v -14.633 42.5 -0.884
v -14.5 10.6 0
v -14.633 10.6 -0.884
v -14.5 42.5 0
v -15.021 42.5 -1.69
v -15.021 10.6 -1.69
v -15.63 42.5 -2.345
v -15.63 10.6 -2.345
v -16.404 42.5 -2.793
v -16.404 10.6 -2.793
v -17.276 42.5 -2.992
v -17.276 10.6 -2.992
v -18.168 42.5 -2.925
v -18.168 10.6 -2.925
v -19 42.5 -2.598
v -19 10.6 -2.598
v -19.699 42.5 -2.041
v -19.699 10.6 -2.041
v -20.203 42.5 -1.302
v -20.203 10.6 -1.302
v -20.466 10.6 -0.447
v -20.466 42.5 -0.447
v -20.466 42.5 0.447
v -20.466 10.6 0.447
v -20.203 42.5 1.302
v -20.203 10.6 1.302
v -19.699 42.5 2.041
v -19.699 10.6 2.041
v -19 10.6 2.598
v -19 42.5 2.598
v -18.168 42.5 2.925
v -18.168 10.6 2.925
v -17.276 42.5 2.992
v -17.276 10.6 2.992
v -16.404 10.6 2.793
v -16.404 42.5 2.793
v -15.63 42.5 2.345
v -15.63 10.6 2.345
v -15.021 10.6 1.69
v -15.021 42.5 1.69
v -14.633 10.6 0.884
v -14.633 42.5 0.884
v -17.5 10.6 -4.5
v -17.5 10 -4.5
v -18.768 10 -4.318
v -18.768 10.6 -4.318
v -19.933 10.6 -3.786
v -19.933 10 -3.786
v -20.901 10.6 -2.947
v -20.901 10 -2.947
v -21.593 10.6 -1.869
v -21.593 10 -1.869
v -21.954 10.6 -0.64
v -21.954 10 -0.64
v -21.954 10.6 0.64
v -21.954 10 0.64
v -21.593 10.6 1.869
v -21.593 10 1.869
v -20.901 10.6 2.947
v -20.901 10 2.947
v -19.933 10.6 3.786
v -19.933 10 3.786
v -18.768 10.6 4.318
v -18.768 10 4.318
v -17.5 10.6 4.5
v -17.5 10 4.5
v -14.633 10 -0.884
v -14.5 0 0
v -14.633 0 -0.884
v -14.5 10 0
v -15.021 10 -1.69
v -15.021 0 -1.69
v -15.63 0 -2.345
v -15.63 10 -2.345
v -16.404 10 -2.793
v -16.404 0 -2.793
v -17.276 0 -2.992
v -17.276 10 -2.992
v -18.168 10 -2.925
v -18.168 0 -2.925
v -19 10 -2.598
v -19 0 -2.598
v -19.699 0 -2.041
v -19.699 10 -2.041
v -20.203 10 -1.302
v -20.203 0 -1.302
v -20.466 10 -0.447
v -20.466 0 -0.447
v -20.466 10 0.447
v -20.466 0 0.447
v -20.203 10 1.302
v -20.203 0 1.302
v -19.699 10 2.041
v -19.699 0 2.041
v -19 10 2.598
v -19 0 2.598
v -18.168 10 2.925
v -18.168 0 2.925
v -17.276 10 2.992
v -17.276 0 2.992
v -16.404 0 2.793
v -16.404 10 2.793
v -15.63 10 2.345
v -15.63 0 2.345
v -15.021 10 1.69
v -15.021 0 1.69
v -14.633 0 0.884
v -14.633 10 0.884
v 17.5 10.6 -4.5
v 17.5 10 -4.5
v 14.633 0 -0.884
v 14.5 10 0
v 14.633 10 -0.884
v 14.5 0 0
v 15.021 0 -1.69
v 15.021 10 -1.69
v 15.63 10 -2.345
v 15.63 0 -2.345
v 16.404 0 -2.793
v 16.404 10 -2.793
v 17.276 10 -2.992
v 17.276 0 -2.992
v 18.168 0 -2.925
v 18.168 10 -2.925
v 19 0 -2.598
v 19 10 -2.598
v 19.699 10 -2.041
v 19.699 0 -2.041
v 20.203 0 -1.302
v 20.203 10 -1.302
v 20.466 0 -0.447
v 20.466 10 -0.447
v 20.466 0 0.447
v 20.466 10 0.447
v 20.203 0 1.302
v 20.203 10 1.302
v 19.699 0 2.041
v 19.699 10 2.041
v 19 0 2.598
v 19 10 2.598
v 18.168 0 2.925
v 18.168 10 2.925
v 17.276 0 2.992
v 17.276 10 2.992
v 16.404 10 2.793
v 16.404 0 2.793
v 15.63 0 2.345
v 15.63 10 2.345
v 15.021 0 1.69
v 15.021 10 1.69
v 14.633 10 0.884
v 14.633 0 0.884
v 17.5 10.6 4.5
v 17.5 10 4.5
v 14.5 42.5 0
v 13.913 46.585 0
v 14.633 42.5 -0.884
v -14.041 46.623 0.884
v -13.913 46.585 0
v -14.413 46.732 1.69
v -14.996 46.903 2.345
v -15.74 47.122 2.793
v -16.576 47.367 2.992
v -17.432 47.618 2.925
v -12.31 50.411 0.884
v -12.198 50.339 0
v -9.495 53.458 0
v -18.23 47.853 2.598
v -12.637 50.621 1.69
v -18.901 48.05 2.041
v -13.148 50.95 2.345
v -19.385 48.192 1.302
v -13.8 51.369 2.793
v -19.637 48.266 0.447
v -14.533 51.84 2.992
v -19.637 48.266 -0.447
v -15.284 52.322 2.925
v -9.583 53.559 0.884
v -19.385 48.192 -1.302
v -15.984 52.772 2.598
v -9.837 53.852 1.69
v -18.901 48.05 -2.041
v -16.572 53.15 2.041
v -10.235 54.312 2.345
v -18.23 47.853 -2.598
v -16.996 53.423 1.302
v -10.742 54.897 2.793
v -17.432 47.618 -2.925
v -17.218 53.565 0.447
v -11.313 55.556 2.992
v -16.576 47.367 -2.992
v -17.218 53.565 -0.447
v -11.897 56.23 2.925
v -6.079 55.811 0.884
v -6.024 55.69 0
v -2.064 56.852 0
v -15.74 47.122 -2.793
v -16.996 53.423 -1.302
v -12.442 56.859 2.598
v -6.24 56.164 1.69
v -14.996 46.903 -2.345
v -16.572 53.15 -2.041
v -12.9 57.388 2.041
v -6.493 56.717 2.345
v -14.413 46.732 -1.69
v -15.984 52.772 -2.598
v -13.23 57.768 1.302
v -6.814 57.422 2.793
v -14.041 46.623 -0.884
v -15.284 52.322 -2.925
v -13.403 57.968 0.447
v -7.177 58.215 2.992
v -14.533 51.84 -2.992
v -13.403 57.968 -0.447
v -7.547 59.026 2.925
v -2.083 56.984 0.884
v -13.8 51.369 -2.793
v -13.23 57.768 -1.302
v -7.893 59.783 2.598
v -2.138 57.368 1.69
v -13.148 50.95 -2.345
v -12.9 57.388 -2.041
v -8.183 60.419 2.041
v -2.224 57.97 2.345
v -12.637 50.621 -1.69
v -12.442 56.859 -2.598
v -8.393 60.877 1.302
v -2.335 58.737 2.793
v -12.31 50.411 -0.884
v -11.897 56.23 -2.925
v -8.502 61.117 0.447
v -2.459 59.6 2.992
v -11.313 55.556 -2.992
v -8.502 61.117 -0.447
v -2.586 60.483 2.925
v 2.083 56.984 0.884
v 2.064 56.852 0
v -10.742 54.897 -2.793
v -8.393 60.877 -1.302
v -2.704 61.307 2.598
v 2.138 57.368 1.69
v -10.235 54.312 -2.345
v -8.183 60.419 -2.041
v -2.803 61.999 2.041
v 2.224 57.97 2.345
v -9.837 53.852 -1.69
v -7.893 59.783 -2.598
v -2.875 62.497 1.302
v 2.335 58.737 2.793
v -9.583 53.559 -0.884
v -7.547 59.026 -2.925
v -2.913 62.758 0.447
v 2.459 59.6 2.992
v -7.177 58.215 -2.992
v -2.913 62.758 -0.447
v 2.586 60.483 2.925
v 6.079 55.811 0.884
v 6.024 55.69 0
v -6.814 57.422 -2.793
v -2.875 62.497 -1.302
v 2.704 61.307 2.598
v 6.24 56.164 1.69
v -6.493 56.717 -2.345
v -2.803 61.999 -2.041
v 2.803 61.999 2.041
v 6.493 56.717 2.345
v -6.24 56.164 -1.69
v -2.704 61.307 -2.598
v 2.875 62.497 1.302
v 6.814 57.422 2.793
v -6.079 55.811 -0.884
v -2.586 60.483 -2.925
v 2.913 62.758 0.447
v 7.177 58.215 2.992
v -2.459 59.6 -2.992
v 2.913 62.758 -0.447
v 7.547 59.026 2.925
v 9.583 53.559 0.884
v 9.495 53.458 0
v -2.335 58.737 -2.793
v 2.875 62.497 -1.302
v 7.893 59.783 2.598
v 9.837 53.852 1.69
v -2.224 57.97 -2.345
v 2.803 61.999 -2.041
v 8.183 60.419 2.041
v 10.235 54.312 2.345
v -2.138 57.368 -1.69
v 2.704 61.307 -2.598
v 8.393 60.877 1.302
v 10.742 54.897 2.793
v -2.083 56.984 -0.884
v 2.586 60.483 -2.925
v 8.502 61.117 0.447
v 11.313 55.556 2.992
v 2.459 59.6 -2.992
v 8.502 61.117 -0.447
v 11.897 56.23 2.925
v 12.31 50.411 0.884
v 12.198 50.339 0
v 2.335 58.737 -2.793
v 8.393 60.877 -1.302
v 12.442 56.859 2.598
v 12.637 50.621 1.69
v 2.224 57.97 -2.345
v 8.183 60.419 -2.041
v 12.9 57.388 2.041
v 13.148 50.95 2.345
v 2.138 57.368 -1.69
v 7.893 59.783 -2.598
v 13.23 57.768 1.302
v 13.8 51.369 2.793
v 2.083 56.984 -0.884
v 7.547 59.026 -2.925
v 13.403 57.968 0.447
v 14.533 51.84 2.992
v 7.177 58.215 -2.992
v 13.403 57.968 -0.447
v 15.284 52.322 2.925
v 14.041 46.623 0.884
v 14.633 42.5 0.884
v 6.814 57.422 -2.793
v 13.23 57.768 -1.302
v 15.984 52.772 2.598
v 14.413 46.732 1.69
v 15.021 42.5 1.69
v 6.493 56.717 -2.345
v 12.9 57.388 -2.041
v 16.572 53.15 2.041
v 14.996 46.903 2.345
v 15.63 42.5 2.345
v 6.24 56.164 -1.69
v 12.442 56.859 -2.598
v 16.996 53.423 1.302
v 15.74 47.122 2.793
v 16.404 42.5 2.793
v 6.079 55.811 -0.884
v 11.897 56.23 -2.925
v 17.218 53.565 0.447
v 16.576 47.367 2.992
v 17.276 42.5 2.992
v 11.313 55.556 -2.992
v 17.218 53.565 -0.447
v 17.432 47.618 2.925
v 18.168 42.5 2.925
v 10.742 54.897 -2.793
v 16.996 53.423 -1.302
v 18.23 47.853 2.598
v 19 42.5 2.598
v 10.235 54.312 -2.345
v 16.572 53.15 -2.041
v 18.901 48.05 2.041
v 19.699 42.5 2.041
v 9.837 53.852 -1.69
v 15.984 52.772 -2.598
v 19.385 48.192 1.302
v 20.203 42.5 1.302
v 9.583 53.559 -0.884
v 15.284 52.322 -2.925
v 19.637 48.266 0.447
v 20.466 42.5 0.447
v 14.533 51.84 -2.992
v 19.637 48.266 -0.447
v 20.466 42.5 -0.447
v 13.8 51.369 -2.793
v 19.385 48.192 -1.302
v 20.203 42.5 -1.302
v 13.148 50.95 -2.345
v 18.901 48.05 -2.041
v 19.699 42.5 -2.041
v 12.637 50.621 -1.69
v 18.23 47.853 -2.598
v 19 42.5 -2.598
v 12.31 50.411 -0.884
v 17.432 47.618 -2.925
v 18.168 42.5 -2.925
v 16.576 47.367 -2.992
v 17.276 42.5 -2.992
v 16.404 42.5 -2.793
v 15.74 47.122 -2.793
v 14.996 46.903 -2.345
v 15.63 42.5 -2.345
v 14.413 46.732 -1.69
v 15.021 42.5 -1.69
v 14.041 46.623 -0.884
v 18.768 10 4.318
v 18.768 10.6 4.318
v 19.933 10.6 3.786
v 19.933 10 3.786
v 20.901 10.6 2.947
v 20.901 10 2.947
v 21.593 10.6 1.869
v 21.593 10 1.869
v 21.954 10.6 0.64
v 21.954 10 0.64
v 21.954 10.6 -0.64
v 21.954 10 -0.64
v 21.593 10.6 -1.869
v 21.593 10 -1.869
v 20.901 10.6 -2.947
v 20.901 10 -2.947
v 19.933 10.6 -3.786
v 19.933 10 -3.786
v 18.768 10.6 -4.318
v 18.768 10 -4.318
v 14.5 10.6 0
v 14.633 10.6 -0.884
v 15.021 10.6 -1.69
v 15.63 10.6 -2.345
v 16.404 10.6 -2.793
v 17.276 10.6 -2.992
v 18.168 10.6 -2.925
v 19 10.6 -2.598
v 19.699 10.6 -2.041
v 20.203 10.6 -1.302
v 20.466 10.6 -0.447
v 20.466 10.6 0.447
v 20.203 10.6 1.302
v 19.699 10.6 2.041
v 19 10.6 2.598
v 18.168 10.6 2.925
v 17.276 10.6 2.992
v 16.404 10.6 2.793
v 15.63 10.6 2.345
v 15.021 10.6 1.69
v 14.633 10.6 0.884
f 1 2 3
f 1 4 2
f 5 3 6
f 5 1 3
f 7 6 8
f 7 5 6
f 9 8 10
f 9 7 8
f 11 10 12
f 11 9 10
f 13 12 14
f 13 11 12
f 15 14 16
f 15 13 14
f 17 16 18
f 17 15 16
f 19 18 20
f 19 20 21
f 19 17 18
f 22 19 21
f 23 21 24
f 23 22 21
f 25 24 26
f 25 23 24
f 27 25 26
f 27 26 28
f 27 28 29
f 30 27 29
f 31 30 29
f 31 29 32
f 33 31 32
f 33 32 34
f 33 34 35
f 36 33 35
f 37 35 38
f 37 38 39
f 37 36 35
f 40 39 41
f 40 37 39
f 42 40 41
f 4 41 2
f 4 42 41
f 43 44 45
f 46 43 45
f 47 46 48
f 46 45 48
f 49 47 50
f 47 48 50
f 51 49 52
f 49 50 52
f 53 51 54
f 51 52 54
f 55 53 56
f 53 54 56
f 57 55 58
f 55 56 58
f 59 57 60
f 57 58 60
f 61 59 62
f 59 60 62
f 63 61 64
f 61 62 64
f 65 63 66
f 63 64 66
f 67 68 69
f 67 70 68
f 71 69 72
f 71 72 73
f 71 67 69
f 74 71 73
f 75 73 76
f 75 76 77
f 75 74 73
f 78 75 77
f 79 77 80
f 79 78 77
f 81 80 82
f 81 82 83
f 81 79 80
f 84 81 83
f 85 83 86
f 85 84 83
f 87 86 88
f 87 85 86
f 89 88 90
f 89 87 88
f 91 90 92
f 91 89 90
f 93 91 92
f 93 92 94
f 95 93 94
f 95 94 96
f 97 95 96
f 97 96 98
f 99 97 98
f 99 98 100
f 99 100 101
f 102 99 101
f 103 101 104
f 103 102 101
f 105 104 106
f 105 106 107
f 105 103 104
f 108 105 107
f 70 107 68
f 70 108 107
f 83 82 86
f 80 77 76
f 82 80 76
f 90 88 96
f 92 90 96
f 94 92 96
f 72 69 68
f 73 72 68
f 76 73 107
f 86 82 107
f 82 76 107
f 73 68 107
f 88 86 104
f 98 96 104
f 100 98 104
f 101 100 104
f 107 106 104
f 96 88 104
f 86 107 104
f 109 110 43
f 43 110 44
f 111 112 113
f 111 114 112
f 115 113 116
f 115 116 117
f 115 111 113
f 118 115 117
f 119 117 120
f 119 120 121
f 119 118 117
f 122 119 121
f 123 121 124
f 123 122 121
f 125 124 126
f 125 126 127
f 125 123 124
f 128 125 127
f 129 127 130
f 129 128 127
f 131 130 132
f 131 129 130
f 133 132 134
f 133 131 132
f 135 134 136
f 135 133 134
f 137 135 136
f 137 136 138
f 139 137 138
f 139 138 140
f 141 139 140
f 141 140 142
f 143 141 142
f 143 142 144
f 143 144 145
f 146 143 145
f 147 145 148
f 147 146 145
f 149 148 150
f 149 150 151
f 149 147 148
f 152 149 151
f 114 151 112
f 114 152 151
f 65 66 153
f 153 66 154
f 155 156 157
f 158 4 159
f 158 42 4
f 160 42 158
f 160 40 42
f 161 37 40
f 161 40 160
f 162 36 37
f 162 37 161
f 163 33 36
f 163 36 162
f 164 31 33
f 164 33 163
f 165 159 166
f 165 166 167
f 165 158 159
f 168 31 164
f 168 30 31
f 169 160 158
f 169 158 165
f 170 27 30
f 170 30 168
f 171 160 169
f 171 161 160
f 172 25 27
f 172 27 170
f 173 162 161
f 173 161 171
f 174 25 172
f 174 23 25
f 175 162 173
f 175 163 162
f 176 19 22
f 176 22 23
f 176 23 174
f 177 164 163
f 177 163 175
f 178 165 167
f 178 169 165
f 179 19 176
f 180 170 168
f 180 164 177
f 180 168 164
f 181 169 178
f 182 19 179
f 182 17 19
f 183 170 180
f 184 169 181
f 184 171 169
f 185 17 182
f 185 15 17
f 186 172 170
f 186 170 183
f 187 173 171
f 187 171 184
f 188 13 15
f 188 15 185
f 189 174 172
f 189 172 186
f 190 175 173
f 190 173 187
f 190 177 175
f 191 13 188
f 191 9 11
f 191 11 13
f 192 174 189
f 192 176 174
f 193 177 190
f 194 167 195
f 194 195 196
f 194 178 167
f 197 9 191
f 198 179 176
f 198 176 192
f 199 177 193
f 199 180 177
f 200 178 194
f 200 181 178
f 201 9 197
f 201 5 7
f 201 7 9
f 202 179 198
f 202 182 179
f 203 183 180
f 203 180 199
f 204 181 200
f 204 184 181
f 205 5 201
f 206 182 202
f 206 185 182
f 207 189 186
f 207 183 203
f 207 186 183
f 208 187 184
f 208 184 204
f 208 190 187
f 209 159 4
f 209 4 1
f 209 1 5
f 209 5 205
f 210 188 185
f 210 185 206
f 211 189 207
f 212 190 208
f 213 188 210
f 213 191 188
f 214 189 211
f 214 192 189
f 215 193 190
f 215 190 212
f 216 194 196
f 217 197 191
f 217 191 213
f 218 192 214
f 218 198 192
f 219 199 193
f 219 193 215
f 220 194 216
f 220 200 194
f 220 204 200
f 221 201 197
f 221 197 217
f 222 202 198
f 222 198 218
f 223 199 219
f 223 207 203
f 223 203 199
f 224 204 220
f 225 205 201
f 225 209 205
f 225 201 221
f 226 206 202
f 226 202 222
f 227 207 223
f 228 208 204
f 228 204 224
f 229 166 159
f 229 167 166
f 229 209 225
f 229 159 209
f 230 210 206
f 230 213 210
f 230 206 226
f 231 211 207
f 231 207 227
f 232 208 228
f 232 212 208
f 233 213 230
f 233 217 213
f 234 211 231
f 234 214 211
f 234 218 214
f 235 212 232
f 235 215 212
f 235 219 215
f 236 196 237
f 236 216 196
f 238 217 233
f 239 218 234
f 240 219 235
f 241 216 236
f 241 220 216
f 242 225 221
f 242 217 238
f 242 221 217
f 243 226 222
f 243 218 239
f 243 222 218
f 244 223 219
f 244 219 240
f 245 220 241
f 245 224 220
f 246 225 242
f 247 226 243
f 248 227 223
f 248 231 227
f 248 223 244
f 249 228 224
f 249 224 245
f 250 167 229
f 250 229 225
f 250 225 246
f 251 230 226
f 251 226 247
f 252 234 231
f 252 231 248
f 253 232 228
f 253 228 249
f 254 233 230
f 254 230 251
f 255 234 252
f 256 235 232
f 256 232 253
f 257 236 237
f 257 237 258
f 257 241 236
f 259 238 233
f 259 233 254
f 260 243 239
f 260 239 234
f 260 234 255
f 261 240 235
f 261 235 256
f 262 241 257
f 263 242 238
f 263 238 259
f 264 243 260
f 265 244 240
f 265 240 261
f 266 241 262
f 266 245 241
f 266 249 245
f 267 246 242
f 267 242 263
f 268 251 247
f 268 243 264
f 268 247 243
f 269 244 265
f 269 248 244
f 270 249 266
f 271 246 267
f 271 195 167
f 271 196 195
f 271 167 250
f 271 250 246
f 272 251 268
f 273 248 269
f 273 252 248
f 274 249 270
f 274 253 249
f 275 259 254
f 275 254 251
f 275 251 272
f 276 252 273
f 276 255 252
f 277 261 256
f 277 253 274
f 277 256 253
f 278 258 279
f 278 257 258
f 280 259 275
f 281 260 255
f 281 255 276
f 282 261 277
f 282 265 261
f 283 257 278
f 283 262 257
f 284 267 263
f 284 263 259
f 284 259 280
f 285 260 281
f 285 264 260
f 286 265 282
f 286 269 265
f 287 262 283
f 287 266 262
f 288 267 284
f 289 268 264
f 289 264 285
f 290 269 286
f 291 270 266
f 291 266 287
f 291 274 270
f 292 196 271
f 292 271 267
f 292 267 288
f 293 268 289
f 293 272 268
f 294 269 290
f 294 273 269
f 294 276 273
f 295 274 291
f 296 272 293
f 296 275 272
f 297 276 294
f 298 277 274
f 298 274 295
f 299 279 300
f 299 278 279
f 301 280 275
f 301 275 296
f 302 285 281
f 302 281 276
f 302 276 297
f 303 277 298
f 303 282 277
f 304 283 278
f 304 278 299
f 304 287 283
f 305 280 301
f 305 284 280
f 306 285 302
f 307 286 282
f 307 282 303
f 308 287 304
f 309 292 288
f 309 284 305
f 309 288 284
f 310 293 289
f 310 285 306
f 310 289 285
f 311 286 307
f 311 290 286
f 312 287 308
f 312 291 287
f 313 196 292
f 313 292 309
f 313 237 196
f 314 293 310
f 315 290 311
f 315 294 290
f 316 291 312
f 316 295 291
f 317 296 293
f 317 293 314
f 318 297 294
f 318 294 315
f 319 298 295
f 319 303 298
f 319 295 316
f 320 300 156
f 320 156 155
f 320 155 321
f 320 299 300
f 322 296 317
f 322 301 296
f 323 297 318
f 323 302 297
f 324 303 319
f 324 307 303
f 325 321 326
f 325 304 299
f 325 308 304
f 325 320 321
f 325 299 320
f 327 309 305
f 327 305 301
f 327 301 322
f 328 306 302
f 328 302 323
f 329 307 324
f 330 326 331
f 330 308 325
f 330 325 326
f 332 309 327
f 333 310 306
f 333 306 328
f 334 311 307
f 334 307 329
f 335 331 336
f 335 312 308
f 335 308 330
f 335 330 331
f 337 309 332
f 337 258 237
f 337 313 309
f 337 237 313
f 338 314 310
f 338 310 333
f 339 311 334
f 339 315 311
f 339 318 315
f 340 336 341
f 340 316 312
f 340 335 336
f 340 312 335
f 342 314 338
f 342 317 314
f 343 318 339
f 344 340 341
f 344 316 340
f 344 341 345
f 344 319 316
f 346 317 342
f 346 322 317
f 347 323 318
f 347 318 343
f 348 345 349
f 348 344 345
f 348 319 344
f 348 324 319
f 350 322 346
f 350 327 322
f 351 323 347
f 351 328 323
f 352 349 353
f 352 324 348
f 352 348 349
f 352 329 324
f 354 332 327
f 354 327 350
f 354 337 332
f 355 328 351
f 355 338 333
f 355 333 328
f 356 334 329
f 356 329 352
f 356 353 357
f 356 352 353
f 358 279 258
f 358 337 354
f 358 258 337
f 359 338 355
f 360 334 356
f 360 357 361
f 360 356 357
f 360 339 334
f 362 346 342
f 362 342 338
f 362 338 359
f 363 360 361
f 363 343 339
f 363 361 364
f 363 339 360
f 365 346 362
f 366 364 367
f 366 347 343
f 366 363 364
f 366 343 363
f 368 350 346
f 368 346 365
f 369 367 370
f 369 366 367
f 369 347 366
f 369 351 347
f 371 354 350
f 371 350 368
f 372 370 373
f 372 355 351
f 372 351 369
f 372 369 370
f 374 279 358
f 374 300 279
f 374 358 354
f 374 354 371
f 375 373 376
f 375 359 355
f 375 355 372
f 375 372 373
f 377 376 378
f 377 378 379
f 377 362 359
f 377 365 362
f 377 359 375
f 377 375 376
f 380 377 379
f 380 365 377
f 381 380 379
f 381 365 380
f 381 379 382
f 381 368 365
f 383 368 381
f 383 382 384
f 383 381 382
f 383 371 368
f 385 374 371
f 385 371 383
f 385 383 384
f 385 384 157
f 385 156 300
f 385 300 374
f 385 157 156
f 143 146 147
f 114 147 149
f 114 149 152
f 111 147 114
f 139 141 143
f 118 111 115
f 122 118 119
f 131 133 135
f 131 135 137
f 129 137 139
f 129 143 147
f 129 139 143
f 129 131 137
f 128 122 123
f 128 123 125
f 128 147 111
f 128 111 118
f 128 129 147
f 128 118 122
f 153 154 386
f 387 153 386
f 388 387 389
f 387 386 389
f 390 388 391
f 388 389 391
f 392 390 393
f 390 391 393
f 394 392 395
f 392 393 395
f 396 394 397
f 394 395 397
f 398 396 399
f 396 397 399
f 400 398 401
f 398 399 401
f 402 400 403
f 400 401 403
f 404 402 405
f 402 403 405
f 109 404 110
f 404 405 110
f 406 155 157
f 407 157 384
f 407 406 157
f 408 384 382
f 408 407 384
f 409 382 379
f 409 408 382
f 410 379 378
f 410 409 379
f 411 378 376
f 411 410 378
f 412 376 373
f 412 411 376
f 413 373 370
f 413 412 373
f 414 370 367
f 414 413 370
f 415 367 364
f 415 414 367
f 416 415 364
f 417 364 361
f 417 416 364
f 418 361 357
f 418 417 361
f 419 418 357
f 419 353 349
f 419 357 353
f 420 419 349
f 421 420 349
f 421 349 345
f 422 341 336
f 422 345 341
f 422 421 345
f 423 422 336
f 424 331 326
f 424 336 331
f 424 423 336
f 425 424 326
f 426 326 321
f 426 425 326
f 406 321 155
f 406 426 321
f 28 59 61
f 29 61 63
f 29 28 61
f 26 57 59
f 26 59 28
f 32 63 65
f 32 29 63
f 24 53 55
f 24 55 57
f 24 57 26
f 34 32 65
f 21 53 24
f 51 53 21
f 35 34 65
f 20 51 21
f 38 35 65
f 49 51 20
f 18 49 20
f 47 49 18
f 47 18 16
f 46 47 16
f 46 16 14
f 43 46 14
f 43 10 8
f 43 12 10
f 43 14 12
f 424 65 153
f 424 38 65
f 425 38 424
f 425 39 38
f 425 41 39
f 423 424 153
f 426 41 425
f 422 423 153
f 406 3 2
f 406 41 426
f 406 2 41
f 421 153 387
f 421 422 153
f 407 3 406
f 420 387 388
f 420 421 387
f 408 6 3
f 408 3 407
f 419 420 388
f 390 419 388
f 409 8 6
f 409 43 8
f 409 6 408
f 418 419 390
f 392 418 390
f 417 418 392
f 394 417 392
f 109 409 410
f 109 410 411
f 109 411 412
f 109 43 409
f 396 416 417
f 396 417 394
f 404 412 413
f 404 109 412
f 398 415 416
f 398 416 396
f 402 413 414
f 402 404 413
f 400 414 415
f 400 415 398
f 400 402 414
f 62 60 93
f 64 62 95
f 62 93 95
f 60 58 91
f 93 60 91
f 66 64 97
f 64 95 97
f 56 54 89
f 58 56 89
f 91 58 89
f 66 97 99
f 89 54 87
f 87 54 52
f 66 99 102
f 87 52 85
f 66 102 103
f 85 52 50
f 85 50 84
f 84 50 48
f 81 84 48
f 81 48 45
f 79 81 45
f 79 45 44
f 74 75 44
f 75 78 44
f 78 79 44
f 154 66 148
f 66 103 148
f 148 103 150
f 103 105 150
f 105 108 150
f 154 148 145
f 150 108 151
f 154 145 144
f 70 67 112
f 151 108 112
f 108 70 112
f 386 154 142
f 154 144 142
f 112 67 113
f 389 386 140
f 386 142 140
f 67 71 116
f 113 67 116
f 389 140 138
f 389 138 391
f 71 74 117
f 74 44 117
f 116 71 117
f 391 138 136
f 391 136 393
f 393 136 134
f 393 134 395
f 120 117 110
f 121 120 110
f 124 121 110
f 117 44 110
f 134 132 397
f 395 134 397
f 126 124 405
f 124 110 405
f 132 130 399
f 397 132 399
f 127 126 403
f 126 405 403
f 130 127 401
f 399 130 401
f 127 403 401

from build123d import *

# Parameters (mm, degrees)
SKETCH1_R           = 3
BOSS_EXTRUDE1_DEPTH = 0.6


with BuildPart() as part:
    # Sweep1: sweep along a path in Sketch2
    with BuildLine(Plane.XY) as sweep1_path:
        Line((-17.5, 0), (-17.5, 42.5))
        ThreePointArc((-17.5, 42.5), (0, 60), (17.5, 42.5))
        Line((17.5, 42.5), (17.5, 0))
    # Sketch1 → Sweep1 (sweep)
    with BuildSketch(Plane(origin=(0, 0, 0), x_dir=(1, 0, 0), z_dir=(0, 1, 0))):
        with Locations((-17.5, 0)):
            Circle(SKETCH1_R)
    sweep(path=sweep1_path.line)

    # Sketch3 → Boss-Extrude1 (add)
    with BuildSketch(Plane(origin=(0, 10, 0), x_dir=(1, 0, 0), z_dir=(0, 1, 0))):
        with BuildLine():
            Line((-17.5, -4.5), (17.5, -4.5))
            ThreePointArc((17.5, -4.5), (22, 0), (17.5, 4.5))
            Line((17.5, 4.5), (-17.5, 4.5))
            ThreePointArc((-17.5, 4.5), (-22, 0), (-17.5, -4.5))
        make_face()
    extrude(amount=BOSS_EXTRUDE1_DEPTH)


solid = part.part
